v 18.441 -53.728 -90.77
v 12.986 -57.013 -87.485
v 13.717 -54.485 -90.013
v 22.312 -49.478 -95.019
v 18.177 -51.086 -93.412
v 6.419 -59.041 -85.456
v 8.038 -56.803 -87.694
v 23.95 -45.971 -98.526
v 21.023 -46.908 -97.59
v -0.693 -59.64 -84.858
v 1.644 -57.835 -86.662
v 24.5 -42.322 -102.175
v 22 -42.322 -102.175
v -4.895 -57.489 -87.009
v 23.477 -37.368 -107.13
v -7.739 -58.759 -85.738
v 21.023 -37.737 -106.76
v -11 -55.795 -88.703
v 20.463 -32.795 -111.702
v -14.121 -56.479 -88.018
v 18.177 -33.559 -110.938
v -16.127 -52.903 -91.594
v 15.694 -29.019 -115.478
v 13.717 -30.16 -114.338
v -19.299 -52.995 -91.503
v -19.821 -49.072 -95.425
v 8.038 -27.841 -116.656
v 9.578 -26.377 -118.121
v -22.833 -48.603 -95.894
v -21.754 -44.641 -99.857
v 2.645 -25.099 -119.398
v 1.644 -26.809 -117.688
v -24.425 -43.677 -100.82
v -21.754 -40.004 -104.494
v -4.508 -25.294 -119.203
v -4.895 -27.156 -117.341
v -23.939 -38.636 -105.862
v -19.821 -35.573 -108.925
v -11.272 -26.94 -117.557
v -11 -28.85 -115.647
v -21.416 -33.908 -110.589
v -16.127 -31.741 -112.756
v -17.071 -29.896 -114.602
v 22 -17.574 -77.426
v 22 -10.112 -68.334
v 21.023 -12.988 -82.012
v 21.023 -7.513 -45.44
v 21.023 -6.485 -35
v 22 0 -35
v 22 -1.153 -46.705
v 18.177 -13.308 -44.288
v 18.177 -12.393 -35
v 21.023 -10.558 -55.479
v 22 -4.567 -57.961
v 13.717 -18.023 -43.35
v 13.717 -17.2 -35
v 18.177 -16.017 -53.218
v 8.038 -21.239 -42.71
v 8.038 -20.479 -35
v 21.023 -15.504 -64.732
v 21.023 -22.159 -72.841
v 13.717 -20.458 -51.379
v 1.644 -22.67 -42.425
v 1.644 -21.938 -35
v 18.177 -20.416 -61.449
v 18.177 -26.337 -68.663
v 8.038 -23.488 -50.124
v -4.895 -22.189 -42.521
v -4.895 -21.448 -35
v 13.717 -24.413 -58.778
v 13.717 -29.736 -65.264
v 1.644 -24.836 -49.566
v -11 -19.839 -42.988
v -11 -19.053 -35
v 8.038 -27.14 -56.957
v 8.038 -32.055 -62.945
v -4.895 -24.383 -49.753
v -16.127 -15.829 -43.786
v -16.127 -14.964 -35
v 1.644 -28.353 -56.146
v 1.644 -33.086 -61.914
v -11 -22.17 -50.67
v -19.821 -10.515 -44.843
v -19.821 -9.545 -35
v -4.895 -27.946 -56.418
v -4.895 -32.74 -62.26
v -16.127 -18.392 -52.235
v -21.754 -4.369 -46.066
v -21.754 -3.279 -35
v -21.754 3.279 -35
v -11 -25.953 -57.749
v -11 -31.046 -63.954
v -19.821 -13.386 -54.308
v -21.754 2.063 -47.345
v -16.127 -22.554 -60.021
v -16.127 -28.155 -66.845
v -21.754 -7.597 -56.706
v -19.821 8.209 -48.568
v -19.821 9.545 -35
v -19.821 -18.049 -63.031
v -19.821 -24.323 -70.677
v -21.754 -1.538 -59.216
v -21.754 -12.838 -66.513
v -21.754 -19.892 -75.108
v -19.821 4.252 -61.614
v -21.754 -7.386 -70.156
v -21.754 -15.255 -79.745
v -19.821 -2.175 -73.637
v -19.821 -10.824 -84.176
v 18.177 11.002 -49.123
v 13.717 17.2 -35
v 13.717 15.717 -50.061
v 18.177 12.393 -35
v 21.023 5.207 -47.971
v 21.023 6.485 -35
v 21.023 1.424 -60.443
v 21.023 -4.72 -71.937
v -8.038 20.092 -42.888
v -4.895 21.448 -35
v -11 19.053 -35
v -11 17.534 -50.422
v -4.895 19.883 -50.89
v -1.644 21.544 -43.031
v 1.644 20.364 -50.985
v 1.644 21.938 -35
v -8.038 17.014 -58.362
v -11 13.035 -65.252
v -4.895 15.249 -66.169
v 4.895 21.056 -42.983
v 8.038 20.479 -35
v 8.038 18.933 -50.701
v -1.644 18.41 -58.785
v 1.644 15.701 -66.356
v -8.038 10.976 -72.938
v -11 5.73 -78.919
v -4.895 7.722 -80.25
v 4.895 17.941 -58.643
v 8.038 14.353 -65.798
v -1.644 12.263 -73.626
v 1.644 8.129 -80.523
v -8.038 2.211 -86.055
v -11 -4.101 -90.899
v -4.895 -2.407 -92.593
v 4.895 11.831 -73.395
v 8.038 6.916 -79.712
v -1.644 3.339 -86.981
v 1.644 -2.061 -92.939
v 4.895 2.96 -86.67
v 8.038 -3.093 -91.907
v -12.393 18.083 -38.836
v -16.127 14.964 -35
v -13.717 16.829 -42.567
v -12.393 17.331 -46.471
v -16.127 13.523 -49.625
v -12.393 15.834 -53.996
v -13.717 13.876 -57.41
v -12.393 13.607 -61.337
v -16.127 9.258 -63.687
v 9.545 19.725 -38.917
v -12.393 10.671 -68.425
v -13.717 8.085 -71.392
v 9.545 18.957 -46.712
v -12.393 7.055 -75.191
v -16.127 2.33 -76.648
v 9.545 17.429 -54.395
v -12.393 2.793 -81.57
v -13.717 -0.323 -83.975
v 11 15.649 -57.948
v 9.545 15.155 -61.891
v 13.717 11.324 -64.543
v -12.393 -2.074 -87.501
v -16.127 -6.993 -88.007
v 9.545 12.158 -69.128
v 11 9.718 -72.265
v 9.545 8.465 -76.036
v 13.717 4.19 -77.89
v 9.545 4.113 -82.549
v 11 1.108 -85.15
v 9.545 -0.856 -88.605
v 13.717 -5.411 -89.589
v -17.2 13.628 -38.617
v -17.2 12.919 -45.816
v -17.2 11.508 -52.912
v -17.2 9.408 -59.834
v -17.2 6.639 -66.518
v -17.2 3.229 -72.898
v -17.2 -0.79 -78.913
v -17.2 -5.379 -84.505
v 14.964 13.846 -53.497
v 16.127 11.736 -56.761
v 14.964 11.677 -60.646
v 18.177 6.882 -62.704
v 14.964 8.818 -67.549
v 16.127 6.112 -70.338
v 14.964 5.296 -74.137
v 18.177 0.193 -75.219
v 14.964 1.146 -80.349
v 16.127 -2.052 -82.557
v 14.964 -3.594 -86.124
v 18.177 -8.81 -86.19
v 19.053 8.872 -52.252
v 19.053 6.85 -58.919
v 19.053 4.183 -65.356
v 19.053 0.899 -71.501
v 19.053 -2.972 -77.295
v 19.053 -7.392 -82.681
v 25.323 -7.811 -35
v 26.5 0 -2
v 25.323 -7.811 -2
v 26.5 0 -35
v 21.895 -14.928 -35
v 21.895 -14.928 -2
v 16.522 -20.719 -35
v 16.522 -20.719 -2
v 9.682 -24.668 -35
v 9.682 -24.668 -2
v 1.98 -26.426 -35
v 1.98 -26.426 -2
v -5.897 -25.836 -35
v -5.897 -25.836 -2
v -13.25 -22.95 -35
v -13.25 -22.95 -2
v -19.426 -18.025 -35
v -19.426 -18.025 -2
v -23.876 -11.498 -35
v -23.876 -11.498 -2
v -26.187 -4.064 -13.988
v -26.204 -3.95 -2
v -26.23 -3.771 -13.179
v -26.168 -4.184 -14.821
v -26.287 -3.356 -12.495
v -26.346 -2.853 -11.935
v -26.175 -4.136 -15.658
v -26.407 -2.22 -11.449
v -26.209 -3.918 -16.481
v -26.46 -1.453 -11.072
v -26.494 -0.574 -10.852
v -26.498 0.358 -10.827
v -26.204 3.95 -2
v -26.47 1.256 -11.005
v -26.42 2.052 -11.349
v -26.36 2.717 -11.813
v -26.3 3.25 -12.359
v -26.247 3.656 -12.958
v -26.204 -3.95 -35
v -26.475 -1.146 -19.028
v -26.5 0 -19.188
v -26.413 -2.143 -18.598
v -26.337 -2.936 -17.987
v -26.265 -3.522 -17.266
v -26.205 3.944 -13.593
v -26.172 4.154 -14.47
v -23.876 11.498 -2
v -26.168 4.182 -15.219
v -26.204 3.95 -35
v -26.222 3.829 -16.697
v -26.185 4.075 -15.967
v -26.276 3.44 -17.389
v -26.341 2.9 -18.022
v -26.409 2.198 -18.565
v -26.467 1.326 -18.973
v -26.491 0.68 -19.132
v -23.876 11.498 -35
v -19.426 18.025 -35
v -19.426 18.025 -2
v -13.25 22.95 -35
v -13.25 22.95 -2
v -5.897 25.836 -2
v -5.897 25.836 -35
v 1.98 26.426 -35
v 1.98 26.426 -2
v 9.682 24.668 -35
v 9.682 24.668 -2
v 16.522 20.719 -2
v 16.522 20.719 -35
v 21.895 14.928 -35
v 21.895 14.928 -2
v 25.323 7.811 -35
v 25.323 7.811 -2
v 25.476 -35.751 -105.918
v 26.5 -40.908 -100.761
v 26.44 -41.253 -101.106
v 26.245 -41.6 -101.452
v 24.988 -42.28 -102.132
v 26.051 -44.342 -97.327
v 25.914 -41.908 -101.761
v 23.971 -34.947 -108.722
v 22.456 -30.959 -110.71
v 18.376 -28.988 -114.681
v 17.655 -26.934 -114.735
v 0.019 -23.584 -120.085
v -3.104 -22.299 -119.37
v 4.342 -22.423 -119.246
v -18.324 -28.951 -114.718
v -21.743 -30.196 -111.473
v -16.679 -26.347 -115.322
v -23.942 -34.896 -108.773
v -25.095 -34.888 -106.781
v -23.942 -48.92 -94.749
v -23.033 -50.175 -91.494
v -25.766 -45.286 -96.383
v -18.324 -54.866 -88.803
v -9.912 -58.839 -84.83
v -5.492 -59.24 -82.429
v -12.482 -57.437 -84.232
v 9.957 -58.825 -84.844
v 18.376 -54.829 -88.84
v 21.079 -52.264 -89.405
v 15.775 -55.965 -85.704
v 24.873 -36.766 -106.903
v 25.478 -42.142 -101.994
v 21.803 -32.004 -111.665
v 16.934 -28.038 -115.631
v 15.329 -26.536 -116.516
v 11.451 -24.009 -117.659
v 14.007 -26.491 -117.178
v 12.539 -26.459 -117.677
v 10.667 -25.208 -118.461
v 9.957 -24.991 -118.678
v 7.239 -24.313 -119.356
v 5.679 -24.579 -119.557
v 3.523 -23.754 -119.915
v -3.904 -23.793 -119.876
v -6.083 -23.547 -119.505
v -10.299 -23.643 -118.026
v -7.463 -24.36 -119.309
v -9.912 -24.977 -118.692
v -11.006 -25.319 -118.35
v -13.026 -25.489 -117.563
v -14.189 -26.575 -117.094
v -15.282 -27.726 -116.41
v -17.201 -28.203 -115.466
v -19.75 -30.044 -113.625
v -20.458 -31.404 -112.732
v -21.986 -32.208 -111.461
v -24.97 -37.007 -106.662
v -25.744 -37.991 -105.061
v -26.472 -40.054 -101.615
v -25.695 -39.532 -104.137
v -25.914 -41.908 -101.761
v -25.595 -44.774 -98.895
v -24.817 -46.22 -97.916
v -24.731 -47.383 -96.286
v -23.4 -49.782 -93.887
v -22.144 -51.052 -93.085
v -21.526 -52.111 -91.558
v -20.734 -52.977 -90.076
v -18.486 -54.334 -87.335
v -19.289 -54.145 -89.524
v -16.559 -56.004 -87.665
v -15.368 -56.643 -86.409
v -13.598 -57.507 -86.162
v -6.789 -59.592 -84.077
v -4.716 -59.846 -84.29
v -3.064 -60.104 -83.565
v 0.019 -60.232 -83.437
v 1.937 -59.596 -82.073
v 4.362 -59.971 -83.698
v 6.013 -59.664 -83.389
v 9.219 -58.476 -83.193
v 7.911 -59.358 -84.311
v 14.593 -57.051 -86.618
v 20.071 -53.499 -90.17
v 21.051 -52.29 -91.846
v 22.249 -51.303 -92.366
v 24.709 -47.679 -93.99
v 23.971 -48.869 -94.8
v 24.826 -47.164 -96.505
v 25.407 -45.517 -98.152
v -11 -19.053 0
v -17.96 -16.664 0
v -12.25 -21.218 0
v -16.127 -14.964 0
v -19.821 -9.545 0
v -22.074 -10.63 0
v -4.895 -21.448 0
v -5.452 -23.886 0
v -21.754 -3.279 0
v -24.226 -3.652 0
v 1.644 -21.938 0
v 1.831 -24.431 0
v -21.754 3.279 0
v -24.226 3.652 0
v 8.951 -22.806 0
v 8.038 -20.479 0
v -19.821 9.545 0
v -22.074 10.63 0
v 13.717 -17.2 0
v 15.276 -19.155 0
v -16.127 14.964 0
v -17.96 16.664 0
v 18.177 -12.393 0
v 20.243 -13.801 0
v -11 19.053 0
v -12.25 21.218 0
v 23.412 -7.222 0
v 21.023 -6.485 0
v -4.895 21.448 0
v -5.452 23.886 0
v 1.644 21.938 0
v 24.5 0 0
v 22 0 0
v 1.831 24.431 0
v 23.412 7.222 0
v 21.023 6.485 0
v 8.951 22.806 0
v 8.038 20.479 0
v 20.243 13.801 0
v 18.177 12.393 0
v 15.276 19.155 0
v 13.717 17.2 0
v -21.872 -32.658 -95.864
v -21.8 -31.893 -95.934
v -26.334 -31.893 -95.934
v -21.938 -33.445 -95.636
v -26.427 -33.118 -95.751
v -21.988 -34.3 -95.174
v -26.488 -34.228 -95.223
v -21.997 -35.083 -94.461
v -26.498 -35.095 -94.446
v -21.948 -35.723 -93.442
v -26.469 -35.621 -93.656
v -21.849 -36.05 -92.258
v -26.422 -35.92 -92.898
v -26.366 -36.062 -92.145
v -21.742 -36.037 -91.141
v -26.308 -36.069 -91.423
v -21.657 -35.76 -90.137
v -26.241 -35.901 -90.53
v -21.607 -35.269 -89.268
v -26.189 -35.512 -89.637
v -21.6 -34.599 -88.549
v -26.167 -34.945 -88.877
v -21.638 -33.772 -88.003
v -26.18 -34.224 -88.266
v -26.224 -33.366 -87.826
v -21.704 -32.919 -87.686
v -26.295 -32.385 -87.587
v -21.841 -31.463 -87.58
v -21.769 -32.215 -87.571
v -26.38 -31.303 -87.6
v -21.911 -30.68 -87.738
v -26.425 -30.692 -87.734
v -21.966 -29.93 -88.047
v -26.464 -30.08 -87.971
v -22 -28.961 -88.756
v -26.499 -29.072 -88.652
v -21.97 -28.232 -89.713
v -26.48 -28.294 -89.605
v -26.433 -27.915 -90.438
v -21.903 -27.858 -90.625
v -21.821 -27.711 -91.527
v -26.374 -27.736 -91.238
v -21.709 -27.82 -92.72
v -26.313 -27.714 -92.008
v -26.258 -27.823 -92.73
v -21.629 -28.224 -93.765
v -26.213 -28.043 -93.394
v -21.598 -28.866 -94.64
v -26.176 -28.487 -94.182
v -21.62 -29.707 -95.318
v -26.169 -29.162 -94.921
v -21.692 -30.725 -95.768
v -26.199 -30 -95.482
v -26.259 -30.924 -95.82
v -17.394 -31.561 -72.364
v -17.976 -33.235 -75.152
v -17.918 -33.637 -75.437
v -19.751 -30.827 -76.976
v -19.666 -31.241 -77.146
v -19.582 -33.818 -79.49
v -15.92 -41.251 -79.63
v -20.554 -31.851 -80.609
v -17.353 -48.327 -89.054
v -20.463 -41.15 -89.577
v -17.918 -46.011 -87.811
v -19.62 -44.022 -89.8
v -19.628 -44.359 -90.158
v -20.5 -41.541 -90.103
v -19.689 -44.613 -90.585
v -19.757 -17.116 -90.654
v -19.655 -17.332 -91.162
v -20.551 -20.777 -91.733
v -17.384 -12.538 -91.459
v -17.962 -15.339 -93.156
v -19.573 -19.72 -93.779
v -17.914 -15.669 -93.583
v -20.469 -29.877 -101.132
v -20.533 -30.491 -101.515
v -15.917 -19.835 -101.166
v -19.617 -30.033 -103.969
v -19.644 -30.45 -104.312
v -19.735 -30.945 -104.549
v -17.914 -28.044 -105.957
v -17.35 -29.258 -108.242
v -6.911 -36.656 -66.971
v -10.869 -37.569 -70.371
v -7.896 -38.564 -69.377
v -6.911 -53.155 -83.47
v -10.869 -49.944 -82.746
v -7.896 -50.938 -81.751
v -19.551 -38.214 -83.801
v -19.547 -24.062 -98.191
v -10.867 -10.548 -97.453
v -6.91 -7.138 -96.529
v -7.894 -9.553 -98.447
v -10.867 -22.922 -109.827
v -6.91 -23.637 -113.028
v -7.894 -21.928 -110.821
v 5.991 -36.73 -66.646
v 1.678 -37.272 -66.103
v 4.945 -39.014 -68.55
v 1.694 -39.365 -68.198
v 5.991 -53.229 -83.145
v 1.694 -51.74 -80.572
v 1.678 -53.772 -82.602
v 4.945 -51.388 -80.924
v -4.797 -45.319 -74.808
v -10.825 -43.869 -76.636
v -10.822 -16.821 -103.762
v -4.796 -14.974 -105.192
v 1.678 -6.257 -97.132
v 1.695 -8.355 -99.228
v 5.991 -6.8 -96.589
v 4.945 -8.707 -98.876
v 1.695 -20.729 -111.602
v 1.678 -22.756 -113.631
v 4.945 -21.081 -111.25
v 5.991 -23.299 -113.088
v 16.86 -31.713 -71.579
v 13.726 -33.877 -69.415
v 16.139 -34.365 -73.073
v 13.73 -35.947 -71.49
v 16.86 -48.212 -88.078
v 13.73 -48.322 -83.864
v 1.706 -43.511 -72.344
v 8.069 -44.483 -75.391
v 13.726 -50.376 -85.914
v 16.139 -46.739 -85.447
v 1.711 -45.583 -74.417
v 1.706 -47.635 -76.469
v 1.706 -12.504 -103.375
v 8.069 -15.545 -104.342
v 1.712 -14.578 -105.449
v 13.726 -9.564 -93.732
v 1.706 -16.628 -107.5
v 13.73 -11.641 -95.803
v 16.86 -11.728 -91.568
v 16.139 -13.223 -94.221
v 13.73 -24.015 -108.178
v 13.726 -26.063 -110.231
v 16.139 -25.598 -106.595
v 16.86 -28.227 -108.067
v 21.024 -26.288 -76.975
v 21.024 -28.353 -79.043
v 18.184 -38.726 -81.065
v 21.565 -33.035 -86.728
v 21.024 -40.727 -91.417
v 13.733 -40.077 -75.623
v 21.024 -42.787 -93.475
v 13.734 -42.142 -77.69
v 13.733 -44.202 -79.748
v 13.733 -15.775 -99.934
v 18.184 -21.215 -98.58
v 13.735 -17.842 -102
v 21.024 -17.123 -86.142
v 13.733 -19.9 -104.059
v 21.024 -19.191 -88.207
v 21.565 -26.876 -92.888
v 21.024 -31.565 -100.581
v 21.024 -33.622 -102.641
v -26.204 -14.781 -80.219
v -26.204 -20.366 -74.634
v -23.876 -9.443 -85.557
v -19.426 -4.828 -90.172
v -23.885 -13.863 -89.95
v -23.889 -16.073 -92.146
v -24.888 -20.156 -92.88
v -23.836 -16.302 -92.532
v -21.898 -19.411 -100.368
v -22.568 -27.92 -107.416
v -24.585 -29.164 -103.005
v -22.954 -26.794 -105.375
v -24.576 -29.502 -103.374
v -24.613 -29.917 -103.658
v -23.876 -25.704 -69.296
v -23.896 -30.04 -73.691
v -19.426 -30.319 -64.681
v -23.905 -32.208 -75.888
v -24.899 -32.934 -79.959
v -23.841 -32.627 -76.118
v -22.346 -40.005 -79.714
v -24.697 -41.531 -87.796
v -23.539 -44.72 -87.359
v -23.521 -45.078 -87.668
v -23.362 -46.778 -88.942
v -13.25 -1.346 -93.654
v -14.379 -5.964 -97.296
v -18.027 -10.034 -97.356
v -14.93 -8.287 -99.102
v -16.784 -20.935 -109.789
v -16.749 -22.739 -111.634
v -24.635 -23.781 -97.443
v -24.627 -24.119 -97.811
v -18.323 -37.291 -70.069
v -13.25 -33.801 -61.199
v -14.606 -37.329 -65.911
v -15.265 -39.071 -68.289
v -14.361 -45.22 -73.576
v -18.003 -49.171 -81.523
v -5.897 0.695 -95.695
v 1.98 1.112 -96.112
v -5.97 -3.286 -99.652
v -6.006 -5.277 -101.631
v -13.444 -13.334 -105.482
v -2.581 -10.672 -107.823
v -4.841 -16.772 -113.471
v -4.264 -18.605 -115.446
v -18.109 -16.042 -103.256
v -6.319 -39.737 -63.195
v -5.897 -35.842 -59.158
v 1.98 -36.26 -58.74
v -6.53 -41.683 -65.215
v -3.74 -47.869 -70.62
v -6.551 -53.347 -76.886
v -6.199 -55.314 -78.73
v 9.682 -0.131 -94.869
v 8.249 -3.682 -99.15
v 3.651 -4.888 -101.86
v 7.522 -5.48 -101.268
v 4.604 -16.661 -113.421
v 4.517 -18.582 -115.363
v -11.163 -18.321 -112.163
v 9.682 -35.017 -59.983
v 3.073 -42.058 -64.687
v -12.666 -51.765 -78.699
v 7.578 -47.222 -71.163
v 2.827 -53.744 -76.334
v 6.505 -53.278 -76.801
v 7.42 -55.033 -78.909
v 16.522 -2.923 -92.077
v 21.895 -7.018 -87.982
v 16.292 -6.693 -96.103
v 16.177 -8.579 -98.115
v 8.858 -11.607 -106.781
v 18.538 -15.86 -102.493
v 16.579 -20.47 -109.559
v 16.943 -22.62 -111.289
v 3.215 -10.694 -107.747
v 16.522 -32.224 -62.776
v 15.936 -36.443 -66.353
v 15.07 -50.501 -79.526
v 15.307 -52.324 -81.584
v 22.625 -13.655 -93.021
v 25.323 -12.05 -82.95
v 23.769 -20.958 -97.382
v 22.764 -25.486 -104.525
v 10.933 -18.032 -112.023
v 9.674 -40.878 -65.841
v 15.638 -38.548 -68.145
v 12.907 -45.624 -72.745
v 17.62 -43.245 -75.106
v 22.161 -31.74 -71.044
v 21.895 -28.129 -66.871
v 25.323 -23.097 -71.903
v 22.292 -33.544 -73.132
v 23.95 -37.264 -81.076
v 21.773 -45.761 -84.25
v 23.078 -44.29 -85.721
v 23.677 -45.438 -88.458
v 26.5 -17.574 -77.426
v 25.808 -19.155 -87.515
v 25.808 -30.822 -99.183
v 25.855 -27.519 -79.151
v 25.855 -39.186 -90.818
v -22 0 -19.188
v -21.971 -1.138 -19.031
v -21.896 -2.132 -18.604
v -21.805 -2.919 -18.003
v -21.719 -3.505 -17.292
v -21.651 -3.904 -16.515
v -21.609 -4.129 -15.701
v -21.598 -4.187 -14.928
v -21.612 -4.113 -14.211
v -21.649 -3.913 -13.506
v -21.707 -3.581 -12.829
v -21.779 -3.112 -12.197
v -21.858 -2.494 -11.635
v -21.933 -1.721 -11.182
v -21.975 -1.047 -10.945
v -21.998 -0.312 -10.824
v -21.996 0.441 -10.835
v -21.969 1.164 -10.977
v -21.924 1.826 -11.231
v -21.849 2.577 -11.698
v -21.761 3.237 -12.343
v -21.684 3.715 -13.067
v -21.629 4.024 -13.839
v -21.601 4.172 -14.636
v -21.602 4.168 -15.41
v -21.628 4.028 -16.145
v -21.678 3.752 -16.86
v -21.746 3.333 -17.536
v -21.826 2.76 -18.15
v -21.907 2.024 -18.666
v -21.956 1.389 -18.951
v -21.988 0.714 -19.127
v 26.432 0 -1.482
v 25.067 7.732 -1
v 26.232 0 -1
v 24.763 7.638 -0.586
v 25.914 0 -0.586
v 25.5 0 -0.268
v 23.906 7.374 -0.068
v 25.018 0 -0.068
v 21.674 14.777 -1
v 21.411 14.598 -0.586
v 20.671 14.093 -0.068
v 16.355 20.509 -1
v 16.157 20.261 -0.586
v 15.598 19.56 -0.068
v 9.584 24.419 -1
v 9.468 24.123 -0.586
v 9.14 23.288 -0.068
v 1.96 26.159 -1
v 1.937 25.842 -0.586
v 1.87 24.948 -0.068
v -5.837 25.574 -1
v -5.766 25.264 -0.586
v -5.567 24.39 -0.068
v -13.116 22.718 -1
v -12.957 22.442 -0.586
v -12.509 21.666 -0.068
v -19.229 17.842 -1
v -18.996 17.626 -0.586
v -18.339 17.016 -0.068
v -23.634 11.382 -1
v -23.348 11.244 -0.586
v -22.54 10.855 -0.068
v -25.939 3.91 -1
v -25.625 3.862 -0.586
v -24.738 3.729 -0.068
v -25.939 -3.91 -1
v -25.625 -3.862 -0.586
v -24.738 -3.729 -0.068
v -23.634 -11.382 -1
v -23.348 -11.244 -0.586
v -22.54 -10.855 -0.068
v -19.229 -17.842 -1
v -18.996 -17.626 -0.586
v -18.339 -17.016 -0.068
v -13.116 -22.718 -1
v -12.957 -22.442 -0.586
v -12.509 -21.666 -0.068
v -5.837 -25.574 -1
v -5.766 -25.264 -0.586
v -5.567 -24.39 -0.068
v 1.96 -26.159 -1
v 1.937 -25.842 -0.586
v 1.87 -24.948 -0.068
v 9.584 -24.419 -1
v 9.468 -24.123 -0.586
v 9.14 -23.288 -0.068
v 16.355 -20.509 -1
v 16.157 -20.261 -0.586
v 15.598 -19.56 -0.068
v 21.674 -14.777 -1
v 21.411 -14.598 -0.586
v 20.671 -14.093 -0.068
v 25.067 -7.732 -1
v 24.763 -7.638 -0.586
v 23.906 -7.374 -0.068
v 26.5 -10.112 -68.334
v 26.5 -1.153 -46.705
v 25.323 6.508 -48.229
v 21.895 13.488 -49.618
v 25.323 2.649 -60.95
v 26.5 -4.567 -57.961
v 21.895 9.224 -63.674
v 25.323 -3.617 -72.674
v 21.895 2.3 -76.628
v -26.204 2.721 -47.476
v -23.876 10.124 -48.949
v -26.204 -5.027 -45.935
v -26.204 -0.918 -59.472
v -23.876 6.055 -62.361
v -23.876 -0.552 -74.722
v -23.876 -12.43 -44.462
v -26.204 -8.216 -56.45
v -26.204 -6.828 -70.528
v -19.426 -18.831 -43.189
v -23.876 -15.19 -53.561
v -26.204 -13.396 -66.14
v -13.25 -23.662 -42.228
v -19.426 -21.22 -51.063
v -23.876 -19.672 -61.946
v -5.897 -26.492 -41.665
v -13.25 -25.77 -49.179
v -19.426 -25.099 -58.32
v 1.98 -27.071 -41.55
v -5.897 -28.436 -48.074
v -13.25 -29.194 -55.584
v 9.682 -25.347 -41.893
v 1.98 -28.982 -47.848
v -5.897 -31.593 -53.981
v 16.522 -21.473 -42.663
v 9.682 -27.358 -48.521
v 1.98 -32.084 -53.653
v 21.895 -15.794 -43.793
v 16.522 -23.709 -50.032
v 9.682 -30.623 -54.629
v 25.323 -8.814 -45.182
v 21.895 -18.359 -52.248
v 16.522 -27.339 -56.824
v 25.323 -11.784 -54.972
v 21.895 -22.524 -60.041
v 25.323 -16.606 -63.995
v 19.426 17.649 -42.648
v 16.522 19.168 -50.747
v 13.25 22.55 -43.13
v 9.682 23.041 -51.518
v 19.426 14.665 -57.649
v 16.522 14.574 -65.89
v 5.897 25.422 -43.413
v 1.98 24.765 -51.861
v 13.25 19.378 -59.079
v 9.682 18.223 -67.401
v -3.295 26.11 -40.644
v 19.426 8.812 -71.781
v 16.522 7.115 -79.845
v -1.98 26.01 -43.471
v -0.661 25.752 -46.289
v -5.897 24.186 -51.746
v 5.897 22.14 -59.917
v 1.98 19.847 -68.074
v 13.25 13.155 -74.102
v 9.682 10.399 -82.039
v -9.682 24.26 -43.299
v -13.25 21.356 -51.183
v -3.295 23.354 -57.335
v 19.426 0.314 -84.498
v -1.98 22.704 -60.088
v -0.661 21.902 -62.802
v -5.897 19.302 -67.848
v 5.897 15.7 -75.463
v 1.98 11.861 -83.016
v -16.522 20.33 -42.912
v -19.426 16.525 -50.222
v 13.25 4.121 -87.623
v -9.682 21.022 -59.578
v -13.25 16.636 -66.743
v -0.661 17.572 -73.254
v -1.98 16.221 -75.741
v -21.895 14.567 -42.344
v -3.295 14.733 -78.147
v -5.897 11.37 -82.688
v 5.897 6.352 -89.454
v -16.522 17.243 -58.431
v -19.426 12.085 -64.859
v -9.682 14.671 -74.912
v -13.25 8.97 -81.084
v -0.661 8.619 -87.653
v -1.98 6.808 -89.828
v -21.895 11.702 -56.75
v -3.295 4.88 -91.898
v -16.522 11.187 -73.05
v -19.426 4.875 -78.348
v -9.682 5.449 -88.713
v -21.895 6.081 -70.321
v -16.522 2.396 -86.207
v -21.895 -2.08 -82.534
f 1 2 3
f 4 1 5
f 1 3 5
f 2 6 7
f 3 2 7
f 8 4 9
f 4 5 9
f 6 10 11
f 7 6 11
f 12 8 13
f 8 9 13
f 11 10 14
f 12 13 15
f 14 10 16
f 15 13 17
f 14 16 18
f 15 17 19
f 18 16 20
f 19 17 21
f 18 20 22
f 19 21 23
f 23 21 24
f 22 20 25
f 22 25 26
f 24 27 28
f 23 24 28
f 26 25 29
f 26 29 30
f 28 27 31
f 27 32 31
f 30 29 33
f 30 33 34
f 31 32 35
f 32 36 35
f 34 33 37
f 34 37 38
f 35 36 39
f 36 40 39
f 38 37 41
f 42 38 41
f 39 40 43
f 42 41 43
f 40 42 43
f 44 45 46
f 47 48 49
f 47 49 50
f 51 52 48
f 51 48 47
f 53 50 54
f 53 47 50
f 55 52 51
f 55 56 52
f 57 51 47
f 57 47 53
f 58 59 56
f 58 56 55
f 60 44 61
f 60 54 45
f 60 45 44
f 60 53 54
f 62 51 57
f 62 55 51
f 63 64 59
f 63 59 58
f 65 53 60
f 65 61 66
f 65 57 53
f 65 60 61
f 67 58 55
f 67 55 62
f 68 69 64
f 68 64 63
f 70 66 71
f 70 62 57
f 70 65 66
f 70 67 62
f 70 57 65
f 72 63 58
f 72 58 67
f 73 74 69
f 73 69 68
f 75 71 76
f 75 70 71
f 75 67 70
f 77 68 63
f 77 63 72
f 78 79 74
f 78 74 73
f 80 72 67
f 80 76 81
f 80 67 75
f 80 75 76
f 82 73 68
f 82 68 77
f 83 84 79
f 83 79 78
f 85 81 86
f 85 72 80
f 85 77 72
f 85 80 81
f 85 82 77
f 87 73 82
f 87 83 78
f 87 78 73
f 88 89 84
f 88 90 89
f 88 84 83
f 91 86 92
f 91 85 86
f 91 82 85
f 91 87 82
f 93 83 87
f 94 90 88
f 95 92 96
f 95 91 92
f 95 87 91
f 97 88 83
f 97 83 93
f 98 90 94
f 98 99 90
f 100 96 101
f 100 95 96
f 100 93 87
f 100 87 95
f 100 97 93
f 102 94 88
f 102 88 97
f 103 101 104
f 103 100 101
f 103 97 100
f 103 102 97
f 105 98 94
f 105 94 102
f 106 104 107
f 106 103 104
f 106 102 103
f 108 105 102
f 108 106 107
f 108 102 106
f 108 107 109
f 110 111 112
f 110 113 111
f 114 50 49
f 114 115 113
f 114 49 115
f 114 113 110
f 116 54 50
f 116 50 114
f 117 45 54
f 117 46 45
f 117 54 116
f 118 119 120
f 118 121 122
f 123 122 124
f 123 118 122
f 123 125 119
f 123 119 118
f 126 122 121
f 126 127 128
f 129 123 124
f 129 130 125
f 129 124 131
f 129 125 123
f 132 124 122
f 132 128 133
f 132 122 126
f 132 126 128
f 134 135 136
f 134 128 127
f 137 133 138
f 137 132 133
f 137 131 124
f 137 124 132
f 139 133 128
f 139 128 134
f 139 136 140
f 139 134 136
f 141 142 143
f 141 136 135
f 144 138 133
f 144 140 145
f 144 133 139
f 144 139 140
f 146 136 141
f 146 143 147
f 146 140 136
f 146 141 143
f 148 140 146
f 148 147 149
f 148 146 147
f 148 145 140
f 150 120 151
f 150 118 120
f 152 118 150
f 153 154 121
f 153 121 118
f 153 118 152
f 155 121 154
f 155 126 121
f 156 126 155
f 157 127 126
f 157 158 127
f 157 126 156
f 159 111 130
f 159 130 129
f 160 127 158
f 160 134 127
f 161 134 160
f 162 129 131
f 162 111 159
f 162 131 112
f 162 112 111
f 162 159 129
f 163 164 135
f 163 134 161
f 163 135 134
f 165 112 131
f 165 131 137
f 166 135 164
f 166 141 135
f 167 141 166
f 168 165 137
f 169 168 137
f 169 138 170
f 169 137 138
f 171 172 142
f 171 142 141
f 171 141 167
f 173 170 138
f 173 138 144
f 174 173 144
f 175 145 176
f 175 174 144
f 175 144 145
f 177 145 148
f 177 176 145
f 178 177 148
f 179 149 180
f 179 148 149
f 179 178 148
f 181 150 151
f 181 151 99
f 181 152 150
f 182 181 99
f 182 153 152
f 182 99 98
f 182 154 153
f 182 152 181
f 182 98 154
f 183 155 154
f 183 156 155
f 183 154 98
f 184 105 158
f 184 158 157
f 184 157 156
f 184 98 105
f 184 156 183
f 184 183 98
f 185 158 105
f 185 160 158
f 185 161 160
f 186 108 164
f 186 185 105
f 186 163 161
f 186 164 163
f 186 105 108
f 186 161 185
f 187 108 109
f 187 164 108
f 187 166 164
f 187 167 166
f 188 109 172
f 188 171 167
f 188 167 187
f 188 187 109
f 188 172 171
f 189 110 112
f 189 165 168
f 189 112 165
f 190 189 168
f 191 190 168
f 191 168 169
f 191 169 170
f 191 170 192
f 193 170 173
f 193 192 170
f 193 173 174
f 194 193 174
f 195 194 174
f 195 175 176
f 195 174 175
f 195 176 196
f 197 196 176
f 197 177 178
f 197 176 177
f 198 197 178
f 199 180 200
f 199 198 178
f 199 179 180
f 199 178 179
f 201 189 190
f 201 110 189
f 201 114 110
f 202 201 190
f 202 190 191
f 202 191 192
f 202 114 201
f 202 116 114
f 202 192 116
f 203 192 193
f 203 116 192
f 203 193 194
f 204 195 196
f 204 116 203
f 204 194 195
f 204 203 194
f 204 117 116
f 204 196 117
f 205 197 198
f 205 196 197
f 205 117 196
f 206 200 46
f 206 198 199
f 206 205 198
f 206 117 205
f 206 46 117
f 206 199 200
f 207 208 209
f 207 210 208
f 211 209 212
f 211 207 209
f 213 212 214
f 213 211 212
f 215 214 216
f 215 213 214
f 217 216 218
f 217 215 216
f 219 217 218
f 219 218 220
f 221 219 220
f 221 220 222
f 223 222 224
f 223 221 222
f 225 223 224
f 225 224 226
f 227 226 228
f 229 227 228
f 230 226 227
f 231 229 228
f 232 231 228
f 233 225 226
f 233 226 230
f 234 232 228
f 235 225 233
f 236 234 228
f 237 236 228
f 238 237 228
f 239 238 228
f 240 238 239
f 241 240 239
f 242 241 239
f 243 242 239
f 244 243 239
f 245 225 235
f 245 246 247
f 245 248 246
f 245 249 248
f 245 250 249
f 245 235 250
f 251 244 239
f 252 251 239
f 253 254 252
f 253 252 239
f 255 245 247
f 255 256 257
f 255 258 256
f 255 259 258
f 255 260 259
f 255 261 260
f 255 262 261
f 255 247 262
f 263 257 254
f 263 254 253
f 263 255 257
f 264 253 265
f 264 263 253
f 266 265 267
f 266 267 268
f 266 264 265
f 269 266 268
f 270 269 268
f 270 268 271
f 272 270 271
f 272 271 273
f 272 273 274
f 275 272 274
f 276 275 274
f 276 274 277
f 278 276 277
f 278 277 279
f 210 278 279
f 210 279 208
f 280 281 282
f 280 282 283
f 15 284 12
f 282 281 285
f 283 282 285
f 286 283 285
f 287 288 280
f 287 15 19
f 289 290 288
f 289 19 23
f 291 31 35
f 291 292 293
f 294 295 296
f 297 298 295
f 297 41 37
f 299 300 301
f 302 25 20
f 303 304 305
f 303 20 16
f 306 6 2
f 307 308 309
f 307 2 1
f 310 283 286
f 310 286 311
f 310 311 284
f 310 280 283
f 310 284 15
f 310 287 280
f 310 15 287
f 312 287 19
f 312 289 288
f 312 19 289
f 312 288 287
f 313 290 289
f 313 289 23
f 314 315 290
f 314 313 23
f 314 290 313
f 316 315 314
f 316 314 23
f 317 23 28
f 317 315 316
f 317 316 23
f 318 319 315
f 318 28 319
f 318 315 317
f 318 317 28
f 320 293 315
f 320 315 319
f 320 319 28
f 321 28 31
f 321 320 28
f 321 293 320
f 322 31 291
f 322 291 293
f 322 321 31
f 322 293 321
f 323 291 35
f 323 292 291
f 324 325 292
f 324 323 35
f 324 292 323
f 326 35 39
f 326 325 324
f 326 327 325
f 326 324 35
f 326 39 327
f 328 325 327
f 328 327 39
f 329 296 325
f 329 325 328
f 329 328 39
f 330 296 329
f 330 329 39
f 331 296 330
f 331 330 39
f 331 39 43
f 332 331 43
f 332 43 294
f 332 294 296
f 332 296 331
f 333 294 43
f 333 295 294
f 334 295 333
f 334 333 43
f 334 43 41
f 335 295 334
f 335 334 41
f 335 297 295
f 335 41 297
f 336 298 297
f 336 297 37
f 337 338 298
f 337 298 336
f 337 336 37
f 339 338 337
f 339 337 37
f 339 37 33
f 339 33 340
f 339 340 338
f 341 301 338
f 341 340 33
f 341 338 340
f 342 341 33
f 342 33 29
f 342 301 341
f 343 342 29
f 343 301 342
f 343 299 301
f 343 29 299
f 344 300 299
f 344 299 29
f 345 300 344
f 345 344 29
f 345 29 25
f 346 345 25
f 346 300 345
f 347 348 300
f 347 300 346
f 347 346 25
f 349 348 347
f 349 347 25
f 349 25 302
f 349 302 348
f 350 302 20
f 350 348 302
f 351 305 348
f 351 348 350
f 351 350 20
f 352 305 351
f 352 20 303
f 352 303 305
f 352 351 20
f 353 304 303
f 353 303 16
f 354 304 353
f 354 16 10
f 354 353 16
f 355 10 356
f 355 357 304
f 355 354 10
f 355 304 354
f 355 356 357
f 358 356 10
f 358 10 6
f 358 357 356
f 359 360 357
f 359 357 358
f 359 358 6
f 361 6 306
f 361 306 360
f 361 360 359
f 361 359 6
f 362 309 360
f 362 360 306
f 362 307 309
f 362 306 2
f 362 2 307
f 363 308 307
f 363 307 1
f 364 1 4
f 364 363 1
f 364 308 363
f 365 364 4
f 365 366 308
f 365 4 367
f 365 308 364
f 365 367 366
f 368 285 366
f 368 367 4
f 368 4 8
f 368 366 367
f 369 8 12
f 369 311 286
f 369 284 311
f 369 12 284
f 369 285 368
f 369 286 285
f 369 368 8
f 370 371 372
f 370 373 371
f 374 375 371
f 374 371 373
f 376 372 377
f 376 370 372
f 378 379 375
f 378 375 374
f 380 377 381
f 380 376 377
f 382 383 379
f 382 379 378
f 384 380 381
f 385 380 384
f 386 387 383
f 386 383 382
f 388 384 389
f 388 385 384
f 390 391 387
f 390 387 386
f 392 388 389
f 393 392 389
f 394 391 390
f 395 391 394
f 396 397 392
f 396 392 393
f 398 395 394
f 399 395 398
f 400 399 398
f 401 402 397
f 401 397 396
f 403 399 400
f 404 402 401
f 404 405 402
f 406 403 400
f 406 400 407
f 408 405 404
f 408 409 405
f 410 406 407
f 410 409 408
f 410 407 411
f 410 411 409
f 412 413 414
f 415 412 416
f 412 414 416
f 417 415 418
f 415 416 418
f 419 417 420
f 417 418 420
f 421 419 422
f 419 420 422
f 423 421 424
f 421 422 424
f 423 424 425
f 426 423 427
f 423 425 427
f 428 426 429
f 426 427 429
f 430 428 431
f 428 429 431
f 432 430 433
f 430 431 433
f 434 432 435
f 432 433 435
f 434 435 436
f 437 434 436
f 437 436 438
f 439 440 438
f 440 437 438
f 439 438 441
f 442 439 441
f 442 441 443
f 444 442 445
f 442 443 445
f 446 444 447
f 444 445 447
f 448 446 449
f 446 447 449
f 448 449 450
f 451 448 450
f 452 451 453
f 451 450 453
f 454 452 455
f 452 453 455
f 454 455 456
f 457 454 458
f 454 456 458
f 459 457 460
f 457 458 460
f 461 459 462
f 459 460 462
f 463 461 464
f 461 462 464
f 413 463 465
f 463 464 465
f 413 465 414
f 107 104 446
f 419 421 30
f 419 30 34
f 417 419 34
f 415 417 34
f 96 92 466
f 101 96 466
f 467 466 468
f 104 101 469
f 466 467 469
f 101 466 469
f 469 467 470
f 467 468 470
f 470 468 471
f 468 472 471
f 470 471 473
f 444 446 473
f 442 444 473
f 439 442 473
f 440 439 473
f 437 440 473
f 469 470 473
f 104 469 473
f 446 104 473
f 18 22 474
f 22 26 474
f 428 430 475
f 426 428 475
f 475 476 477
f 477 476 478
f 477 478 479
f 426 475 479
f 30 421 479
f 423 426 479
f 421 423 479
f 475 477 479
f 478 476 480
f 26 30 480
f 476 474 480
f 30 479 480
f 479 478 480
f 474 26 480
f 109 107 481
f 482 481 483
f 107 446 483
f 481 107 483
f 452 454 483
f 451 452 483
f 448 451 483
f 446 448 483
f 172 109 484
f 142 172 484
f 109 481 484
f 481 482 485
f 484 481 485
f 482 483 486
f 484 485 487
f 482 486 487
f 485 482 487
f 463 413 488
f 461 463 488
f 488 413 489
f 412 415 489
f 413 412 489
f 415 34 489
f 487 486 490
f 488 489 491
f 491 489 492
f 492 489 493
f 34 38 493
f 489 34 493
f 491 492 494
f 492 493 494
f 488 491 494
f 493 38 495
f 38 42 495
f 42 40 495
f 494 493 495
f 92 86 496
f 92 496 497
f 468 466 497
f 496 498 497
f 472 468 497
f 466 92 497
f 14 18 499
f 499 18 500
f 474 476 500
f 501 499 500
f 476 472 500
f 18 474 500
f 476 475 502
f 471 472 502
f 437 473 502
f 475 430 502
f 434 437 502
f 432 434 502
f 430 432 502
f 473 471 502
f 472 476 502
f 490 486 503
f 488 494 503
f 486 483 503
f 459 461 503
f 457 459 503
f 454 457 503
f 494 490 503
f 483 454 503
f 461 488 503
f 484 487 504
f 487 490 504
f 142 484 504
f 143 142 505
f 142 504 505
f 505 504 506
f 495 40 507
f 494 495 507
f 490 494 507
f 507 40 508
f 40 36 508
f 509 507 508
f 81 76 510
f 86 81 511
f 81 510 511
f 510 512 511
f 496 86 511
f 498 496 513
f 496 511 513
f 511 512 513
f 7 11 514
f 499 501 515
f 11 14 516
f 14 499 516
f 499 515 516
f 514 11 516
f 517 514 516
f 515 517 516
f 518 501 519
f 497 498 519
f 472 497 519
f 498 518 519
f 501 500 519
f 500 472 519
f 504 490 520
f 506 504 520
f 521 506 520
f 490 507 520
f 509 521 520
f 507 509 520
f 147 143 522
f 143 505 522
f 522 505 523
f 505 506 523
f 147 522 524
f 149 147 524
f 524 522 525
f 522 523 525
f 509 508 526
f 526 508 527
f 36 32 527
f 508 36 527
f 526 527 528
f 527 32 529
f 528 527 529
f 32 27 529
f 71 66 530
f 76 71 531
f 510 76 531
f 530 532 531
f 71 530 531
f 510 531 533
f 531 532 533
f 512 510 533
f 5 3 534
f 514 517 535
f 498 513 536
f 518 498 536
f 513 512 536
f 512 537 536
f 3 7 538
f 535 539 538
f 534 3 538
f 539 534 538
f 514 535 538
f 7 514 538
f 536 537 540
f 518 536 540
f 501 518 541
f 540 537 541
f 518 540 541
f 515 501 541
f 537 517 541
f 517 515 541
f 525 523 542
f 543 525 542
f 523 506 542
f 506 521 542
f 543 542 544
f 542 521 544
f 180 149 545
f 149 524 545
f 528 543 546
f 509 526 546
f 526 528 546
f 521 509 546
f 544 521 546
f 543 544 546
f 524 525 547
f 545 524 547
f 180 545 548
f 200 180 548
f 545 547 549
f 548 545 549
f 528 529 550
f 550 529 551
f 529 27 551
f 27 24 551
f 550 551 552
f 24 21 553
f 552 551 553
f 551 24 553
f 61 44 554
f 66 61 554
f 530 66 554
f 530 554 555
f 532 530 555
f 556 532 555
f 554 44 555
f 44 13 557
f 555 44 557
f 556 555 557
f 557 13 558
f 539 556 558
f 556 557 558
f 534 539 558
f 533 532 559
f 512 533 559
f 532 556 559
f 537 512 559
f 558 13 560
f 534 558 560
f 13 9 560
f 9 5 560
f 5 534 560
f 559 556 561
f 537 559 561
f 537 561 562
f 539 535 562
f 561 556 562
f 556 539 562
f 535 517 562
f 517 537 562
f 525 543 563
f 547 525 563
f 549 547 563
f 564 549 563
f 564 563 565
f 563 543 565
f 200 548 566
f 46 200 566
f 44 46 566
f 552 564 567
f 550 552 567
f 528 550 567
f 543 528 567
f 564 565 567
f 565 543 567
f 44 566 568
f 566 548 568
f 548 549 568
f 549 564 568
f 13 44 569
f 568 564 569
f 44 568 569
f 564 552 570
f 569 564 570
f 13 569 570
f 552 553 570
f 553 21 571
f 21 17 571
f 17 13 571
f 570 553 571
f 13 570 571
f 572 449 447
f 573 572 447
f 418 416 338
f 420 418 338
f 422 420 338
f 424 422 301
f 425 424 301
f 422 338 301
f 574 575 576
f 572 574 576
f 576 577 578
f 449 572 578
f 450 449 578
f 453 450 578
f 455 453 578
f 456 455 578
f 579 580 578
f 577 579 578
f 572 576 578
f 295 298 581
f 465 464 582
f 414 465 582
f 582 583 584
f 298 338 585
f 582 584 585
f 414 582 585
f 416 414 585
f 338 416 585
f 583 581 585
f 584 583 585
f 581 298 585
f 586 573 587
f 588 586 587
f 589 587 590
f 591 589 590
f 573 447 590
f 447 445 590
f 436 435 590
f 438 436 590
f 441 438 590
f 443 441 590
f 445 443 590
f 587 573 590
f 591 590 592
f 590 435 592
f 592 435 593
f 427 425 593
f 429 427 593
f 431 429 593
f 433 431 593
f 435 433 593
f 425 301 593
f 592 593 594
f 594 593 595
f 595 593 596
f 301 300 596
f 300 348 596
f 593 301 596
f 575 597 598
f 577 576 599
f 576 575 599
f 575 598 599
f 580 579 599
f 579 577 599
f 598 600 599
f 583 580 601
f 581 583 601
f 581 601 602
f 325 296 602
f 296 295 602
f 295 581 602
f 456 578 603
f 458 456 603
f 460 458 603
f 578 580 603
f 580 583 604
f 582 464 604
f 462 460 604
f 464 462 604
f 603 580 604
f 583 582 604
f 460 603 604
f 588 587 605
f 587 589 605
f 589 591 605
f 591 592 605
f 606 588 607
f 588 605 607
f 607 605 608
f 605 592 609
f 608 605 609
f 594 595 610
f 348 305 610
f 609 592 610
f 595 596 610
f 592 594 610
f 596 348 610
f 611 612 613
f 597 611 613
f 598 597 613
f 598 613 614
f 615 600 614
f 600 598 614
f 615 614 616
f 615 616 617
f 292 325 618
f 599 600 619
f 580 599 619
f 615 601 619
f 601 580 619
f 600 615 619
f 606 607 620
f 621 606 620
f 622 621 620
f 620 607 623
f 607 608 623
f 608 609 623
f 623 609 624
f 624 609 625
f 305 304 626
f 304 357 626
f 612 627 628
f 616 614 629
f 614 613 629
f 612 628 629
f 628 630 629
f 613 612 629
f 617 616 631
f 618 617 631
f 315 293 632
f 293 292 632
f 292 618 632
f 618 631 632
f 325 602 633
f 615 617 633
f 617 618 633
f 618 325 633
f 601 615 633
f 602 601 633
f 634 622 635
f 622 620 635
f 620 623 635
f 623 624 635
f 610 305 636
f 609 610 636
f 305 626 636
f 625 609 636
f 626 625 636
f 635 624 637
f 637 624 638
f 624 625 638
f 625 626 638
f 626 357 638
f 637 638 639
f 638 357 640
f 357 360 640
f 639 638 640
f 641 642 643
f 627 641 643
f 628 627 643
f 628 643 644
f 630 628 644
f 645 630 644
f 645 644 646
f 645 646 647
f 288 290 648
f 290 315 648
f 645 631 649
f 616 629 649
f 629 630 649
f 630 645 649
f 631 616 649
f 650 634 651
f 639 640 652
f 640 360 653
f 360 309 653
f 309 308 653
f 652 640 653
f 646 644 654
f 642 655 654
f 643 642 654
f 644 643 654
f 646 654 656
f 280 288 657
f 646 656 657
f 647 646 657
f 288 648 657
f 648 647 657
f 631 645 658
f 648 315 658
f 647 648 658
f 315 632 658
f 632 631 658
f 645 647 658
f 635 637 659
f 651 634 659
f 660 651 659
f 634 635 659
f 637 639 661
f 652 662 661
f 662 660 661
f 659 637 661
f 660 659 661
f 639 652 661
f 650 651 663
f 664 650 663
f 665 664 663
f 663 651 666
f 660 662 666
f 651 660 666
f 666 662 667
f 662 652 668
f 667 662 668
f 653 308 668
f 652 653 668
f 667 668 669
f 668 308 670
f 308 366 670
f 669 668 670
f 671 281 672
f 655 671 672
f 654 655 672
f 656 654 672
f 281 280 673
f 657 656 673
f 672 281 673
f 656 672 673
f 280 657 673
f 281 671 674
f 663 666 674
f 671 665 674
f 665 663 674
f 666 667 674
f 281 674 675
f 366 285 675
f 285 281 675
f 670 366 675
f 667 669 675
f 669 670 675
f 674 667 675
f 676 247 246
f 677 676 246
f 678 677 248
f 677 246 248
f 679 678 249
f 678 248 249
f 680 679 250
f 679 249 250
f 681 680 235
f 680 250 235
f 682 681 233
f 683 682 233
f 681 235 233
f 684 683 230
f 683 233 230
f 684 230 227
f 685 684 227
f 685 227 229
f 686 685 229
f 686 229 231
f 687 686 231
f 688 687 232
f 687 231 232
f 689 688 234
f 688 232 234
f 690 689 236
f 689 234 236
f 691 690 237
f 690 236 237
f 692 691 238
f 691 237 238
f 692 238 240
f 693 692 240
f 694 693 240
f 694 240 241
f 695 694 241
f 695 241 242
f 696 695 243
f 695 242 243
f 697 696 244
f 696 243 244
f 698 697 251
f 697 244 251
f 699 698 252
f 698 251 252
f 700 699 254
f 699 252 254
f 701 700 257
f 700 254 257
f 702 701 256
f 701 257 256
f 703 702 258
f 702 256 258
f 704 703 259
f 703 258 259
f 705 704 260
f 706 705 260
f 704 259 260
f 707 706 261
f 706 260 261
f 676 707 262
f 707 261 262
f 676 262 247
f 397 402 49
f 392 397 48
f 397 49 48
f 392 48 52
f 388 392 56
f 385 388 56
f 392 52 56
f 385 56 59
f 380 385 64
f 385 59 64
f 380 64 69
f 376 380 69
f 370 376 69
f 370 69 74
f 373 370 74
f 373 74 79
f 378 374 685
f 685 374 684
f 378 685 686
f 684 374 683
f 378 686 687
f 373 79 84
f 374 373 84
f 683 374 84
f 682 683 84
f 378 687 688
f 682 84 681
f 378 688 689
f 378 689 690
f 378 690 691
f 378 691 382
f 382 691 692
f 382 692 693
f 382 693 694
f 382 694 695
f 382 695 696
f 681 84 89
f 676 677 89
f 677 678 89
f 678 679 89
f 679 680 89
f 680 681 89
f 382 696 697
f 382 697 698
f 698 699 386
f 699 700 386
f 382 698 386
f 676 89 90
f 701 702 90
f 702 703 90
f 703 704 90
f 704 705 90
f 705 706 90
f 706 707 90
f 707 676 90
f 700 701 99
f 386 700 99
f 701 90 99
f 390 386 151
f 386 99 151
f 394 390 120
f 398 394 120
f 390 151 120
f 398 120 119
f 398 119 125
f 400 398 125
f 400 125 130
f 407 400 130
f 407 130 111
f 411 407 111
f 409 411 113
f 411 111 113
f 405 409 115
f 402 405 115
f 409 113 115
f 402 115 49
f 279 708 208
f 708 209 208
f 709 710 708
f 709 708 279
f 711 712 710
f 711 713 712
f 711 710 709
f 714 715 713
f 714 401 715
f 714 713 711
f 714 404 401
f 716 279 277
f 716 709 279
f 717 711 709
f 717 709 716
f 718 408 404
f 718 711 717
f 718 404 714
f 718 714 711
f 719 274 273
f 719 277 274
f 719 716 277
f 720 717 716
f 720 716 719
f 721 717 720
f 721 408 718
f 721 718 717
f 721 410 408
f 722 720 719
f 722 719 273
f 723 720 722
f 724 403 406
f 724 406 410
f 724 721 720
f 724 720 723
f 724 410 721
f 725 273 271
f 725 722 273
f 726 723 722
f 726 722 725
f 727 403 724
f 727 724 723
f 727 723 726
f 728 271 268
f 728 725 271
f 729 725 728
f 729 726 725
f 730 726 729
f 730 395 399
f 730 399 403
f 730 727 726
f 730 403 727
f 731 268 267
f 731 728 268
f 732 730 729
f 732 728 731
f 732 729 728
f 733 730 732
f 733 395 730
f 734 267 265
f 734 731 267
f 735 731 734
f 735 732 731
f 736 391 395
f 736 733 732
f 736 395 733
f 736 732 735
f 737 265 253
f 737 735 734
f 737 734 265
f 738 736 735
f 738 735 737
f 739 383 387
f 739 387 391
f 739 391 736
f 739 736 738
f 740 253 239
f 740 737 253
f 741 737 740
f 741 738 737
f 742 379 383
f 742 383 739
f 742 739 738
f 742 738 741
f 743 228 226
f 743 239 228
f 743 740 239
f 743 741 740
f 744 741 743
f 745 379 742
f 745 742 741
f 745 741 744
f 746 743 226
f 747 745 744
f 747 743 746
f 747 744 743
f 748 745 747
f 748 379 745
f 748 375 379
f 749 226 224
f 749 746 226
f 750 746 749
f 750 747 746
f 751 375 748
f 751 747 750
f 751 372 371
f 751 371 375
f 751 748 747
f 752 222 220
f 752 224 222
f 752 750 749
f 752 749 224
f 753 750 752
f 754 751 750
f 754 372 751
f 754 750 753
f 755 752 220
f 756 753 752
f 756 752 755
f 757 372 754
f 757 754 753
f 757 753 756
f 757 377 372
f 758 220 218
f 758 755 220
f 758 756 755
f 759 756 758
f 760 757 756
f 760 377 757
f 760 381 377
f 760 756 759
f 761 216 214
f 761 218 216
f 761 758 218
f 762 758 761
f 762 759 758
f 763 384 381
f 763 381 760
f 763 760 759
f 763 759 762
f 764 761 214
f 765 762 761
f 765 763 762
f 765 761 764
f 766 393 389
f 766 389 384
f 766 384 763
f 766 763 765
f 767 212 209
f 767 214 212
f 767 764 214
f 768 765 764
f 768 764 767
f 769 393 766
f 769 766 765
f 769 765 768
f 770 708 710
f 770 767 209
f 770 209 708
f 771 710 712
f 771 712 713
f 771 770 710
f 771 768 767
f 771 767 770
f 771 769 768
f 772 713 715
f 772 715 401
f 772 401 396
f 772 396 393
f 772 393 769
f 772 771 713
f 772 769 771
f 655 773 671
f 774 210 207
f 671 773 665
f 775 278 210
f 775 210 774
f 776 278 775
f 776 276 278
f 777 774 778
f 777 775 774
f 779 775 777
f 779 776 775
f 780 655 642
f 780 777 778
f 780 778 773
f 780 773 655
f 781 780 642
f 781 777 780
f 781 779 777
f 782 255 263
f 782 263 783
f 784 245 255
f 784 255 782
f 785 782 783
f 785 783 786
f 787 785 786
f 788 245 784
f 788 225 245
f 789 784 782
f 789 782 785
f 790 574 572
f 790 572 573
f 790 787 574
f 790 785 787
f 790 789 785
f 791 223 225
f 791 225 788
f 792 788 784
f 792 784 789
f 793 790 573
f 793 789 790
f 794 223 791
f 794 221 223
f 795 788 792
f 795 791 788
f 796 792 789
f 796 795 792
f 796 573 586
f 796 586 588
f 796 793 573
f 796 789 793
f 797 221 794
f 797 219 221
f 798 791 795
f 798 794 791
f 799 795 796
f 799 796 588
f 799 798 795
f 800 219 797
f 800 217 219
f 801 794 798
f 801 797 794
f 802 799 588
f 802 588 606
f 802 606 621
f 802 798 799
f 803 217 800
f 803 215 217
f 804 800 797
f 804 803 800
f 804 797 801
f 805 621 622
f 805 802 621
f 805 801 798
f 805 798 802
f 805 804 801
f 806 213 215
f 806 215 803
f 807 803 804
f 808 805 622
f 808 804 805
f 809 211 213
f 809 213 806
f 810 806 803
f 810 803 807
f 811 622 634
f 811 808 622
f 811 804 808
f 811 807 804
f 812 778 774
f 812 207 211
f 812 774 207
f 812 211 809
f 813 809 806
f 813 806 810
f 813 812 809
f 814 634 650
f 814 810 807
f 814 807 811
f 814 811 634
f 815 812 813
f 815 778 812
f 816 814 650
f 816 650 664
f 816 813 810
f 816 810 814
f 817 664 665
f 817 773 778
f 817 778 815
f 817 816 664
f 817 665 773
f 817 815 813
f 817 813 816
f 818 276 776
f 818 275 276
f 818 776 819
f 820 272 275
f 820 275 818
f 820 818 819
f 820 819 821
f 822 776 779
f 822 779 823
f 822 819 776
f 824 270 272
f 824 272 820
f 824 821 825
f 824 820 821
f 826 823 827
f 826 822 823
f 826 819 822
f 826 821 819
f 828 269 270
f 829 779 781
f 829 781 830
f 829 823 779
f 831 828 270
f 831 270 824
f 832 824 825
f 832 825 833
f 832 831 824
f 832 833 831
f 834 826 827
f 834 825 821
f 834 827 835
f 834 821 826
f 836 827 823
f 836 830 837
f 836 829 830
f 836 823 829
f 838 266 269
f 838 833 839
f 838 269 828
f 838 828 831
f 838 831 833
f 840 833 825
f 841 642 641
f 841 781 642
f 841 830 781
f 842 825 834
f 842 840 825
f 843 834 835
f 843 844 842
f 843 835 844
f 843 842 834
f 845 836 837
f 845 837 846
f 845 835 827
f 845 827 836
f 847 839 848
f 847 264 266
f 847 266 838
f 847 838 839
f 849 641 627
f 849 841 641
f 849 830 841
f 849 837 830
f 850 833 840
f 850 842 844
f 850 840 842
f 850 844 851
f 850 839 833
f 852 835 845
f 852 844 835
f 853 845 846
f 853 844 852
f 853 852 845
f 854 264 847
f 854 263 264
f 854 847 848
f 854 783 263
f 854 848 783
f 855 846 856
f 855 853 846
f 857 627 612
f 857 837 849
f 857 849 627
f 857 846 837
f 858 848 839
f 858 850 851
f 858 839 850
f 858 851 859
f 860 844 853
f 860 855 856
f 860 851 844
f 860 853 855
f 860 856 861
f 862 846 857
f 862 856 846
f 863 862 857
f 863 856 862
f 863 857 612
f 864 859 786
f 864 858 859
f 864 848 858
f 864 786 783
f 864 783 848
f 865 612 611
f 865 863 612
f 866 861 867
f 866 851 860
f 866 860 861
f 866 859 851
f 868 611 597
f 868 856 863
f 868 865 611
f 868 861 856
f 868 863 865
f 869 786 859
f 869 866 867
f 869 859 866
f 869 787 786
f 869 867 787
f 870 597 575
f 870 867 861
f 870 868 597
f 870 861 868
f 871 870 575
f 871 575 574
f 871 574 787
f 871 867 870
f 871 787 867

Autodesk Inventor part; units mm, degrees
ref_plane "YZ Plane" through (0, 0, 0) normal (1, 0, 0) x (0, 1, 0)
ref_plane "XZ Plane" through (0, 0, 0) normal (0, 1, 0) x (-1, 0, 0)
ref_plane "XY Plane" through (0, 0, 0) normal (0, 0, 1) x (1, 0, 0)
sketch "Sketch3" plane through (0, 0, 0) normal (1, 0, 0) x (0, 1, 0)
  line L0 (0, 0) -> (0, -35)
  line L1 (-17.5736, -77.4264) -> (-42.3223, -102.1751)
  arc A0 (-17.5736, -77.4264) -> (0, -35) centre (-60, -35) ccw
  point P0 (0, -59.8528)
  point P1 (0, -15)
  point P2 (-31.8934, -91.7462)
  dimension "d36" = 135
  dimension "d37" = 60
  dimension "d41" = 15
  dimension "d50" = 35
sketch "Sketch1" plane through (0, 0, 0) normal (0, 0, 1) x (1, 0, 0)
  circle A0 centre (0, 0) radius 22
  circle A1 centre (0, 0) radius 26.5
  dimension "d1" = 53
  dimension "d2" = 44
sweep "Sweep1" add profiles "Sketch1" path "Sketch3"
hole "Hole3" at (0, 0, -15) at (0, -31.8934, -91.7462) direction (-1, 0, 0) diameter 8.376 end through all
fillet "Fillet3" radius 2 2 edges at (-26.5, 0, 0) (-26.5, -42.3223, -102.1751)
properties part number "55-7" material "Iron, Cast"
